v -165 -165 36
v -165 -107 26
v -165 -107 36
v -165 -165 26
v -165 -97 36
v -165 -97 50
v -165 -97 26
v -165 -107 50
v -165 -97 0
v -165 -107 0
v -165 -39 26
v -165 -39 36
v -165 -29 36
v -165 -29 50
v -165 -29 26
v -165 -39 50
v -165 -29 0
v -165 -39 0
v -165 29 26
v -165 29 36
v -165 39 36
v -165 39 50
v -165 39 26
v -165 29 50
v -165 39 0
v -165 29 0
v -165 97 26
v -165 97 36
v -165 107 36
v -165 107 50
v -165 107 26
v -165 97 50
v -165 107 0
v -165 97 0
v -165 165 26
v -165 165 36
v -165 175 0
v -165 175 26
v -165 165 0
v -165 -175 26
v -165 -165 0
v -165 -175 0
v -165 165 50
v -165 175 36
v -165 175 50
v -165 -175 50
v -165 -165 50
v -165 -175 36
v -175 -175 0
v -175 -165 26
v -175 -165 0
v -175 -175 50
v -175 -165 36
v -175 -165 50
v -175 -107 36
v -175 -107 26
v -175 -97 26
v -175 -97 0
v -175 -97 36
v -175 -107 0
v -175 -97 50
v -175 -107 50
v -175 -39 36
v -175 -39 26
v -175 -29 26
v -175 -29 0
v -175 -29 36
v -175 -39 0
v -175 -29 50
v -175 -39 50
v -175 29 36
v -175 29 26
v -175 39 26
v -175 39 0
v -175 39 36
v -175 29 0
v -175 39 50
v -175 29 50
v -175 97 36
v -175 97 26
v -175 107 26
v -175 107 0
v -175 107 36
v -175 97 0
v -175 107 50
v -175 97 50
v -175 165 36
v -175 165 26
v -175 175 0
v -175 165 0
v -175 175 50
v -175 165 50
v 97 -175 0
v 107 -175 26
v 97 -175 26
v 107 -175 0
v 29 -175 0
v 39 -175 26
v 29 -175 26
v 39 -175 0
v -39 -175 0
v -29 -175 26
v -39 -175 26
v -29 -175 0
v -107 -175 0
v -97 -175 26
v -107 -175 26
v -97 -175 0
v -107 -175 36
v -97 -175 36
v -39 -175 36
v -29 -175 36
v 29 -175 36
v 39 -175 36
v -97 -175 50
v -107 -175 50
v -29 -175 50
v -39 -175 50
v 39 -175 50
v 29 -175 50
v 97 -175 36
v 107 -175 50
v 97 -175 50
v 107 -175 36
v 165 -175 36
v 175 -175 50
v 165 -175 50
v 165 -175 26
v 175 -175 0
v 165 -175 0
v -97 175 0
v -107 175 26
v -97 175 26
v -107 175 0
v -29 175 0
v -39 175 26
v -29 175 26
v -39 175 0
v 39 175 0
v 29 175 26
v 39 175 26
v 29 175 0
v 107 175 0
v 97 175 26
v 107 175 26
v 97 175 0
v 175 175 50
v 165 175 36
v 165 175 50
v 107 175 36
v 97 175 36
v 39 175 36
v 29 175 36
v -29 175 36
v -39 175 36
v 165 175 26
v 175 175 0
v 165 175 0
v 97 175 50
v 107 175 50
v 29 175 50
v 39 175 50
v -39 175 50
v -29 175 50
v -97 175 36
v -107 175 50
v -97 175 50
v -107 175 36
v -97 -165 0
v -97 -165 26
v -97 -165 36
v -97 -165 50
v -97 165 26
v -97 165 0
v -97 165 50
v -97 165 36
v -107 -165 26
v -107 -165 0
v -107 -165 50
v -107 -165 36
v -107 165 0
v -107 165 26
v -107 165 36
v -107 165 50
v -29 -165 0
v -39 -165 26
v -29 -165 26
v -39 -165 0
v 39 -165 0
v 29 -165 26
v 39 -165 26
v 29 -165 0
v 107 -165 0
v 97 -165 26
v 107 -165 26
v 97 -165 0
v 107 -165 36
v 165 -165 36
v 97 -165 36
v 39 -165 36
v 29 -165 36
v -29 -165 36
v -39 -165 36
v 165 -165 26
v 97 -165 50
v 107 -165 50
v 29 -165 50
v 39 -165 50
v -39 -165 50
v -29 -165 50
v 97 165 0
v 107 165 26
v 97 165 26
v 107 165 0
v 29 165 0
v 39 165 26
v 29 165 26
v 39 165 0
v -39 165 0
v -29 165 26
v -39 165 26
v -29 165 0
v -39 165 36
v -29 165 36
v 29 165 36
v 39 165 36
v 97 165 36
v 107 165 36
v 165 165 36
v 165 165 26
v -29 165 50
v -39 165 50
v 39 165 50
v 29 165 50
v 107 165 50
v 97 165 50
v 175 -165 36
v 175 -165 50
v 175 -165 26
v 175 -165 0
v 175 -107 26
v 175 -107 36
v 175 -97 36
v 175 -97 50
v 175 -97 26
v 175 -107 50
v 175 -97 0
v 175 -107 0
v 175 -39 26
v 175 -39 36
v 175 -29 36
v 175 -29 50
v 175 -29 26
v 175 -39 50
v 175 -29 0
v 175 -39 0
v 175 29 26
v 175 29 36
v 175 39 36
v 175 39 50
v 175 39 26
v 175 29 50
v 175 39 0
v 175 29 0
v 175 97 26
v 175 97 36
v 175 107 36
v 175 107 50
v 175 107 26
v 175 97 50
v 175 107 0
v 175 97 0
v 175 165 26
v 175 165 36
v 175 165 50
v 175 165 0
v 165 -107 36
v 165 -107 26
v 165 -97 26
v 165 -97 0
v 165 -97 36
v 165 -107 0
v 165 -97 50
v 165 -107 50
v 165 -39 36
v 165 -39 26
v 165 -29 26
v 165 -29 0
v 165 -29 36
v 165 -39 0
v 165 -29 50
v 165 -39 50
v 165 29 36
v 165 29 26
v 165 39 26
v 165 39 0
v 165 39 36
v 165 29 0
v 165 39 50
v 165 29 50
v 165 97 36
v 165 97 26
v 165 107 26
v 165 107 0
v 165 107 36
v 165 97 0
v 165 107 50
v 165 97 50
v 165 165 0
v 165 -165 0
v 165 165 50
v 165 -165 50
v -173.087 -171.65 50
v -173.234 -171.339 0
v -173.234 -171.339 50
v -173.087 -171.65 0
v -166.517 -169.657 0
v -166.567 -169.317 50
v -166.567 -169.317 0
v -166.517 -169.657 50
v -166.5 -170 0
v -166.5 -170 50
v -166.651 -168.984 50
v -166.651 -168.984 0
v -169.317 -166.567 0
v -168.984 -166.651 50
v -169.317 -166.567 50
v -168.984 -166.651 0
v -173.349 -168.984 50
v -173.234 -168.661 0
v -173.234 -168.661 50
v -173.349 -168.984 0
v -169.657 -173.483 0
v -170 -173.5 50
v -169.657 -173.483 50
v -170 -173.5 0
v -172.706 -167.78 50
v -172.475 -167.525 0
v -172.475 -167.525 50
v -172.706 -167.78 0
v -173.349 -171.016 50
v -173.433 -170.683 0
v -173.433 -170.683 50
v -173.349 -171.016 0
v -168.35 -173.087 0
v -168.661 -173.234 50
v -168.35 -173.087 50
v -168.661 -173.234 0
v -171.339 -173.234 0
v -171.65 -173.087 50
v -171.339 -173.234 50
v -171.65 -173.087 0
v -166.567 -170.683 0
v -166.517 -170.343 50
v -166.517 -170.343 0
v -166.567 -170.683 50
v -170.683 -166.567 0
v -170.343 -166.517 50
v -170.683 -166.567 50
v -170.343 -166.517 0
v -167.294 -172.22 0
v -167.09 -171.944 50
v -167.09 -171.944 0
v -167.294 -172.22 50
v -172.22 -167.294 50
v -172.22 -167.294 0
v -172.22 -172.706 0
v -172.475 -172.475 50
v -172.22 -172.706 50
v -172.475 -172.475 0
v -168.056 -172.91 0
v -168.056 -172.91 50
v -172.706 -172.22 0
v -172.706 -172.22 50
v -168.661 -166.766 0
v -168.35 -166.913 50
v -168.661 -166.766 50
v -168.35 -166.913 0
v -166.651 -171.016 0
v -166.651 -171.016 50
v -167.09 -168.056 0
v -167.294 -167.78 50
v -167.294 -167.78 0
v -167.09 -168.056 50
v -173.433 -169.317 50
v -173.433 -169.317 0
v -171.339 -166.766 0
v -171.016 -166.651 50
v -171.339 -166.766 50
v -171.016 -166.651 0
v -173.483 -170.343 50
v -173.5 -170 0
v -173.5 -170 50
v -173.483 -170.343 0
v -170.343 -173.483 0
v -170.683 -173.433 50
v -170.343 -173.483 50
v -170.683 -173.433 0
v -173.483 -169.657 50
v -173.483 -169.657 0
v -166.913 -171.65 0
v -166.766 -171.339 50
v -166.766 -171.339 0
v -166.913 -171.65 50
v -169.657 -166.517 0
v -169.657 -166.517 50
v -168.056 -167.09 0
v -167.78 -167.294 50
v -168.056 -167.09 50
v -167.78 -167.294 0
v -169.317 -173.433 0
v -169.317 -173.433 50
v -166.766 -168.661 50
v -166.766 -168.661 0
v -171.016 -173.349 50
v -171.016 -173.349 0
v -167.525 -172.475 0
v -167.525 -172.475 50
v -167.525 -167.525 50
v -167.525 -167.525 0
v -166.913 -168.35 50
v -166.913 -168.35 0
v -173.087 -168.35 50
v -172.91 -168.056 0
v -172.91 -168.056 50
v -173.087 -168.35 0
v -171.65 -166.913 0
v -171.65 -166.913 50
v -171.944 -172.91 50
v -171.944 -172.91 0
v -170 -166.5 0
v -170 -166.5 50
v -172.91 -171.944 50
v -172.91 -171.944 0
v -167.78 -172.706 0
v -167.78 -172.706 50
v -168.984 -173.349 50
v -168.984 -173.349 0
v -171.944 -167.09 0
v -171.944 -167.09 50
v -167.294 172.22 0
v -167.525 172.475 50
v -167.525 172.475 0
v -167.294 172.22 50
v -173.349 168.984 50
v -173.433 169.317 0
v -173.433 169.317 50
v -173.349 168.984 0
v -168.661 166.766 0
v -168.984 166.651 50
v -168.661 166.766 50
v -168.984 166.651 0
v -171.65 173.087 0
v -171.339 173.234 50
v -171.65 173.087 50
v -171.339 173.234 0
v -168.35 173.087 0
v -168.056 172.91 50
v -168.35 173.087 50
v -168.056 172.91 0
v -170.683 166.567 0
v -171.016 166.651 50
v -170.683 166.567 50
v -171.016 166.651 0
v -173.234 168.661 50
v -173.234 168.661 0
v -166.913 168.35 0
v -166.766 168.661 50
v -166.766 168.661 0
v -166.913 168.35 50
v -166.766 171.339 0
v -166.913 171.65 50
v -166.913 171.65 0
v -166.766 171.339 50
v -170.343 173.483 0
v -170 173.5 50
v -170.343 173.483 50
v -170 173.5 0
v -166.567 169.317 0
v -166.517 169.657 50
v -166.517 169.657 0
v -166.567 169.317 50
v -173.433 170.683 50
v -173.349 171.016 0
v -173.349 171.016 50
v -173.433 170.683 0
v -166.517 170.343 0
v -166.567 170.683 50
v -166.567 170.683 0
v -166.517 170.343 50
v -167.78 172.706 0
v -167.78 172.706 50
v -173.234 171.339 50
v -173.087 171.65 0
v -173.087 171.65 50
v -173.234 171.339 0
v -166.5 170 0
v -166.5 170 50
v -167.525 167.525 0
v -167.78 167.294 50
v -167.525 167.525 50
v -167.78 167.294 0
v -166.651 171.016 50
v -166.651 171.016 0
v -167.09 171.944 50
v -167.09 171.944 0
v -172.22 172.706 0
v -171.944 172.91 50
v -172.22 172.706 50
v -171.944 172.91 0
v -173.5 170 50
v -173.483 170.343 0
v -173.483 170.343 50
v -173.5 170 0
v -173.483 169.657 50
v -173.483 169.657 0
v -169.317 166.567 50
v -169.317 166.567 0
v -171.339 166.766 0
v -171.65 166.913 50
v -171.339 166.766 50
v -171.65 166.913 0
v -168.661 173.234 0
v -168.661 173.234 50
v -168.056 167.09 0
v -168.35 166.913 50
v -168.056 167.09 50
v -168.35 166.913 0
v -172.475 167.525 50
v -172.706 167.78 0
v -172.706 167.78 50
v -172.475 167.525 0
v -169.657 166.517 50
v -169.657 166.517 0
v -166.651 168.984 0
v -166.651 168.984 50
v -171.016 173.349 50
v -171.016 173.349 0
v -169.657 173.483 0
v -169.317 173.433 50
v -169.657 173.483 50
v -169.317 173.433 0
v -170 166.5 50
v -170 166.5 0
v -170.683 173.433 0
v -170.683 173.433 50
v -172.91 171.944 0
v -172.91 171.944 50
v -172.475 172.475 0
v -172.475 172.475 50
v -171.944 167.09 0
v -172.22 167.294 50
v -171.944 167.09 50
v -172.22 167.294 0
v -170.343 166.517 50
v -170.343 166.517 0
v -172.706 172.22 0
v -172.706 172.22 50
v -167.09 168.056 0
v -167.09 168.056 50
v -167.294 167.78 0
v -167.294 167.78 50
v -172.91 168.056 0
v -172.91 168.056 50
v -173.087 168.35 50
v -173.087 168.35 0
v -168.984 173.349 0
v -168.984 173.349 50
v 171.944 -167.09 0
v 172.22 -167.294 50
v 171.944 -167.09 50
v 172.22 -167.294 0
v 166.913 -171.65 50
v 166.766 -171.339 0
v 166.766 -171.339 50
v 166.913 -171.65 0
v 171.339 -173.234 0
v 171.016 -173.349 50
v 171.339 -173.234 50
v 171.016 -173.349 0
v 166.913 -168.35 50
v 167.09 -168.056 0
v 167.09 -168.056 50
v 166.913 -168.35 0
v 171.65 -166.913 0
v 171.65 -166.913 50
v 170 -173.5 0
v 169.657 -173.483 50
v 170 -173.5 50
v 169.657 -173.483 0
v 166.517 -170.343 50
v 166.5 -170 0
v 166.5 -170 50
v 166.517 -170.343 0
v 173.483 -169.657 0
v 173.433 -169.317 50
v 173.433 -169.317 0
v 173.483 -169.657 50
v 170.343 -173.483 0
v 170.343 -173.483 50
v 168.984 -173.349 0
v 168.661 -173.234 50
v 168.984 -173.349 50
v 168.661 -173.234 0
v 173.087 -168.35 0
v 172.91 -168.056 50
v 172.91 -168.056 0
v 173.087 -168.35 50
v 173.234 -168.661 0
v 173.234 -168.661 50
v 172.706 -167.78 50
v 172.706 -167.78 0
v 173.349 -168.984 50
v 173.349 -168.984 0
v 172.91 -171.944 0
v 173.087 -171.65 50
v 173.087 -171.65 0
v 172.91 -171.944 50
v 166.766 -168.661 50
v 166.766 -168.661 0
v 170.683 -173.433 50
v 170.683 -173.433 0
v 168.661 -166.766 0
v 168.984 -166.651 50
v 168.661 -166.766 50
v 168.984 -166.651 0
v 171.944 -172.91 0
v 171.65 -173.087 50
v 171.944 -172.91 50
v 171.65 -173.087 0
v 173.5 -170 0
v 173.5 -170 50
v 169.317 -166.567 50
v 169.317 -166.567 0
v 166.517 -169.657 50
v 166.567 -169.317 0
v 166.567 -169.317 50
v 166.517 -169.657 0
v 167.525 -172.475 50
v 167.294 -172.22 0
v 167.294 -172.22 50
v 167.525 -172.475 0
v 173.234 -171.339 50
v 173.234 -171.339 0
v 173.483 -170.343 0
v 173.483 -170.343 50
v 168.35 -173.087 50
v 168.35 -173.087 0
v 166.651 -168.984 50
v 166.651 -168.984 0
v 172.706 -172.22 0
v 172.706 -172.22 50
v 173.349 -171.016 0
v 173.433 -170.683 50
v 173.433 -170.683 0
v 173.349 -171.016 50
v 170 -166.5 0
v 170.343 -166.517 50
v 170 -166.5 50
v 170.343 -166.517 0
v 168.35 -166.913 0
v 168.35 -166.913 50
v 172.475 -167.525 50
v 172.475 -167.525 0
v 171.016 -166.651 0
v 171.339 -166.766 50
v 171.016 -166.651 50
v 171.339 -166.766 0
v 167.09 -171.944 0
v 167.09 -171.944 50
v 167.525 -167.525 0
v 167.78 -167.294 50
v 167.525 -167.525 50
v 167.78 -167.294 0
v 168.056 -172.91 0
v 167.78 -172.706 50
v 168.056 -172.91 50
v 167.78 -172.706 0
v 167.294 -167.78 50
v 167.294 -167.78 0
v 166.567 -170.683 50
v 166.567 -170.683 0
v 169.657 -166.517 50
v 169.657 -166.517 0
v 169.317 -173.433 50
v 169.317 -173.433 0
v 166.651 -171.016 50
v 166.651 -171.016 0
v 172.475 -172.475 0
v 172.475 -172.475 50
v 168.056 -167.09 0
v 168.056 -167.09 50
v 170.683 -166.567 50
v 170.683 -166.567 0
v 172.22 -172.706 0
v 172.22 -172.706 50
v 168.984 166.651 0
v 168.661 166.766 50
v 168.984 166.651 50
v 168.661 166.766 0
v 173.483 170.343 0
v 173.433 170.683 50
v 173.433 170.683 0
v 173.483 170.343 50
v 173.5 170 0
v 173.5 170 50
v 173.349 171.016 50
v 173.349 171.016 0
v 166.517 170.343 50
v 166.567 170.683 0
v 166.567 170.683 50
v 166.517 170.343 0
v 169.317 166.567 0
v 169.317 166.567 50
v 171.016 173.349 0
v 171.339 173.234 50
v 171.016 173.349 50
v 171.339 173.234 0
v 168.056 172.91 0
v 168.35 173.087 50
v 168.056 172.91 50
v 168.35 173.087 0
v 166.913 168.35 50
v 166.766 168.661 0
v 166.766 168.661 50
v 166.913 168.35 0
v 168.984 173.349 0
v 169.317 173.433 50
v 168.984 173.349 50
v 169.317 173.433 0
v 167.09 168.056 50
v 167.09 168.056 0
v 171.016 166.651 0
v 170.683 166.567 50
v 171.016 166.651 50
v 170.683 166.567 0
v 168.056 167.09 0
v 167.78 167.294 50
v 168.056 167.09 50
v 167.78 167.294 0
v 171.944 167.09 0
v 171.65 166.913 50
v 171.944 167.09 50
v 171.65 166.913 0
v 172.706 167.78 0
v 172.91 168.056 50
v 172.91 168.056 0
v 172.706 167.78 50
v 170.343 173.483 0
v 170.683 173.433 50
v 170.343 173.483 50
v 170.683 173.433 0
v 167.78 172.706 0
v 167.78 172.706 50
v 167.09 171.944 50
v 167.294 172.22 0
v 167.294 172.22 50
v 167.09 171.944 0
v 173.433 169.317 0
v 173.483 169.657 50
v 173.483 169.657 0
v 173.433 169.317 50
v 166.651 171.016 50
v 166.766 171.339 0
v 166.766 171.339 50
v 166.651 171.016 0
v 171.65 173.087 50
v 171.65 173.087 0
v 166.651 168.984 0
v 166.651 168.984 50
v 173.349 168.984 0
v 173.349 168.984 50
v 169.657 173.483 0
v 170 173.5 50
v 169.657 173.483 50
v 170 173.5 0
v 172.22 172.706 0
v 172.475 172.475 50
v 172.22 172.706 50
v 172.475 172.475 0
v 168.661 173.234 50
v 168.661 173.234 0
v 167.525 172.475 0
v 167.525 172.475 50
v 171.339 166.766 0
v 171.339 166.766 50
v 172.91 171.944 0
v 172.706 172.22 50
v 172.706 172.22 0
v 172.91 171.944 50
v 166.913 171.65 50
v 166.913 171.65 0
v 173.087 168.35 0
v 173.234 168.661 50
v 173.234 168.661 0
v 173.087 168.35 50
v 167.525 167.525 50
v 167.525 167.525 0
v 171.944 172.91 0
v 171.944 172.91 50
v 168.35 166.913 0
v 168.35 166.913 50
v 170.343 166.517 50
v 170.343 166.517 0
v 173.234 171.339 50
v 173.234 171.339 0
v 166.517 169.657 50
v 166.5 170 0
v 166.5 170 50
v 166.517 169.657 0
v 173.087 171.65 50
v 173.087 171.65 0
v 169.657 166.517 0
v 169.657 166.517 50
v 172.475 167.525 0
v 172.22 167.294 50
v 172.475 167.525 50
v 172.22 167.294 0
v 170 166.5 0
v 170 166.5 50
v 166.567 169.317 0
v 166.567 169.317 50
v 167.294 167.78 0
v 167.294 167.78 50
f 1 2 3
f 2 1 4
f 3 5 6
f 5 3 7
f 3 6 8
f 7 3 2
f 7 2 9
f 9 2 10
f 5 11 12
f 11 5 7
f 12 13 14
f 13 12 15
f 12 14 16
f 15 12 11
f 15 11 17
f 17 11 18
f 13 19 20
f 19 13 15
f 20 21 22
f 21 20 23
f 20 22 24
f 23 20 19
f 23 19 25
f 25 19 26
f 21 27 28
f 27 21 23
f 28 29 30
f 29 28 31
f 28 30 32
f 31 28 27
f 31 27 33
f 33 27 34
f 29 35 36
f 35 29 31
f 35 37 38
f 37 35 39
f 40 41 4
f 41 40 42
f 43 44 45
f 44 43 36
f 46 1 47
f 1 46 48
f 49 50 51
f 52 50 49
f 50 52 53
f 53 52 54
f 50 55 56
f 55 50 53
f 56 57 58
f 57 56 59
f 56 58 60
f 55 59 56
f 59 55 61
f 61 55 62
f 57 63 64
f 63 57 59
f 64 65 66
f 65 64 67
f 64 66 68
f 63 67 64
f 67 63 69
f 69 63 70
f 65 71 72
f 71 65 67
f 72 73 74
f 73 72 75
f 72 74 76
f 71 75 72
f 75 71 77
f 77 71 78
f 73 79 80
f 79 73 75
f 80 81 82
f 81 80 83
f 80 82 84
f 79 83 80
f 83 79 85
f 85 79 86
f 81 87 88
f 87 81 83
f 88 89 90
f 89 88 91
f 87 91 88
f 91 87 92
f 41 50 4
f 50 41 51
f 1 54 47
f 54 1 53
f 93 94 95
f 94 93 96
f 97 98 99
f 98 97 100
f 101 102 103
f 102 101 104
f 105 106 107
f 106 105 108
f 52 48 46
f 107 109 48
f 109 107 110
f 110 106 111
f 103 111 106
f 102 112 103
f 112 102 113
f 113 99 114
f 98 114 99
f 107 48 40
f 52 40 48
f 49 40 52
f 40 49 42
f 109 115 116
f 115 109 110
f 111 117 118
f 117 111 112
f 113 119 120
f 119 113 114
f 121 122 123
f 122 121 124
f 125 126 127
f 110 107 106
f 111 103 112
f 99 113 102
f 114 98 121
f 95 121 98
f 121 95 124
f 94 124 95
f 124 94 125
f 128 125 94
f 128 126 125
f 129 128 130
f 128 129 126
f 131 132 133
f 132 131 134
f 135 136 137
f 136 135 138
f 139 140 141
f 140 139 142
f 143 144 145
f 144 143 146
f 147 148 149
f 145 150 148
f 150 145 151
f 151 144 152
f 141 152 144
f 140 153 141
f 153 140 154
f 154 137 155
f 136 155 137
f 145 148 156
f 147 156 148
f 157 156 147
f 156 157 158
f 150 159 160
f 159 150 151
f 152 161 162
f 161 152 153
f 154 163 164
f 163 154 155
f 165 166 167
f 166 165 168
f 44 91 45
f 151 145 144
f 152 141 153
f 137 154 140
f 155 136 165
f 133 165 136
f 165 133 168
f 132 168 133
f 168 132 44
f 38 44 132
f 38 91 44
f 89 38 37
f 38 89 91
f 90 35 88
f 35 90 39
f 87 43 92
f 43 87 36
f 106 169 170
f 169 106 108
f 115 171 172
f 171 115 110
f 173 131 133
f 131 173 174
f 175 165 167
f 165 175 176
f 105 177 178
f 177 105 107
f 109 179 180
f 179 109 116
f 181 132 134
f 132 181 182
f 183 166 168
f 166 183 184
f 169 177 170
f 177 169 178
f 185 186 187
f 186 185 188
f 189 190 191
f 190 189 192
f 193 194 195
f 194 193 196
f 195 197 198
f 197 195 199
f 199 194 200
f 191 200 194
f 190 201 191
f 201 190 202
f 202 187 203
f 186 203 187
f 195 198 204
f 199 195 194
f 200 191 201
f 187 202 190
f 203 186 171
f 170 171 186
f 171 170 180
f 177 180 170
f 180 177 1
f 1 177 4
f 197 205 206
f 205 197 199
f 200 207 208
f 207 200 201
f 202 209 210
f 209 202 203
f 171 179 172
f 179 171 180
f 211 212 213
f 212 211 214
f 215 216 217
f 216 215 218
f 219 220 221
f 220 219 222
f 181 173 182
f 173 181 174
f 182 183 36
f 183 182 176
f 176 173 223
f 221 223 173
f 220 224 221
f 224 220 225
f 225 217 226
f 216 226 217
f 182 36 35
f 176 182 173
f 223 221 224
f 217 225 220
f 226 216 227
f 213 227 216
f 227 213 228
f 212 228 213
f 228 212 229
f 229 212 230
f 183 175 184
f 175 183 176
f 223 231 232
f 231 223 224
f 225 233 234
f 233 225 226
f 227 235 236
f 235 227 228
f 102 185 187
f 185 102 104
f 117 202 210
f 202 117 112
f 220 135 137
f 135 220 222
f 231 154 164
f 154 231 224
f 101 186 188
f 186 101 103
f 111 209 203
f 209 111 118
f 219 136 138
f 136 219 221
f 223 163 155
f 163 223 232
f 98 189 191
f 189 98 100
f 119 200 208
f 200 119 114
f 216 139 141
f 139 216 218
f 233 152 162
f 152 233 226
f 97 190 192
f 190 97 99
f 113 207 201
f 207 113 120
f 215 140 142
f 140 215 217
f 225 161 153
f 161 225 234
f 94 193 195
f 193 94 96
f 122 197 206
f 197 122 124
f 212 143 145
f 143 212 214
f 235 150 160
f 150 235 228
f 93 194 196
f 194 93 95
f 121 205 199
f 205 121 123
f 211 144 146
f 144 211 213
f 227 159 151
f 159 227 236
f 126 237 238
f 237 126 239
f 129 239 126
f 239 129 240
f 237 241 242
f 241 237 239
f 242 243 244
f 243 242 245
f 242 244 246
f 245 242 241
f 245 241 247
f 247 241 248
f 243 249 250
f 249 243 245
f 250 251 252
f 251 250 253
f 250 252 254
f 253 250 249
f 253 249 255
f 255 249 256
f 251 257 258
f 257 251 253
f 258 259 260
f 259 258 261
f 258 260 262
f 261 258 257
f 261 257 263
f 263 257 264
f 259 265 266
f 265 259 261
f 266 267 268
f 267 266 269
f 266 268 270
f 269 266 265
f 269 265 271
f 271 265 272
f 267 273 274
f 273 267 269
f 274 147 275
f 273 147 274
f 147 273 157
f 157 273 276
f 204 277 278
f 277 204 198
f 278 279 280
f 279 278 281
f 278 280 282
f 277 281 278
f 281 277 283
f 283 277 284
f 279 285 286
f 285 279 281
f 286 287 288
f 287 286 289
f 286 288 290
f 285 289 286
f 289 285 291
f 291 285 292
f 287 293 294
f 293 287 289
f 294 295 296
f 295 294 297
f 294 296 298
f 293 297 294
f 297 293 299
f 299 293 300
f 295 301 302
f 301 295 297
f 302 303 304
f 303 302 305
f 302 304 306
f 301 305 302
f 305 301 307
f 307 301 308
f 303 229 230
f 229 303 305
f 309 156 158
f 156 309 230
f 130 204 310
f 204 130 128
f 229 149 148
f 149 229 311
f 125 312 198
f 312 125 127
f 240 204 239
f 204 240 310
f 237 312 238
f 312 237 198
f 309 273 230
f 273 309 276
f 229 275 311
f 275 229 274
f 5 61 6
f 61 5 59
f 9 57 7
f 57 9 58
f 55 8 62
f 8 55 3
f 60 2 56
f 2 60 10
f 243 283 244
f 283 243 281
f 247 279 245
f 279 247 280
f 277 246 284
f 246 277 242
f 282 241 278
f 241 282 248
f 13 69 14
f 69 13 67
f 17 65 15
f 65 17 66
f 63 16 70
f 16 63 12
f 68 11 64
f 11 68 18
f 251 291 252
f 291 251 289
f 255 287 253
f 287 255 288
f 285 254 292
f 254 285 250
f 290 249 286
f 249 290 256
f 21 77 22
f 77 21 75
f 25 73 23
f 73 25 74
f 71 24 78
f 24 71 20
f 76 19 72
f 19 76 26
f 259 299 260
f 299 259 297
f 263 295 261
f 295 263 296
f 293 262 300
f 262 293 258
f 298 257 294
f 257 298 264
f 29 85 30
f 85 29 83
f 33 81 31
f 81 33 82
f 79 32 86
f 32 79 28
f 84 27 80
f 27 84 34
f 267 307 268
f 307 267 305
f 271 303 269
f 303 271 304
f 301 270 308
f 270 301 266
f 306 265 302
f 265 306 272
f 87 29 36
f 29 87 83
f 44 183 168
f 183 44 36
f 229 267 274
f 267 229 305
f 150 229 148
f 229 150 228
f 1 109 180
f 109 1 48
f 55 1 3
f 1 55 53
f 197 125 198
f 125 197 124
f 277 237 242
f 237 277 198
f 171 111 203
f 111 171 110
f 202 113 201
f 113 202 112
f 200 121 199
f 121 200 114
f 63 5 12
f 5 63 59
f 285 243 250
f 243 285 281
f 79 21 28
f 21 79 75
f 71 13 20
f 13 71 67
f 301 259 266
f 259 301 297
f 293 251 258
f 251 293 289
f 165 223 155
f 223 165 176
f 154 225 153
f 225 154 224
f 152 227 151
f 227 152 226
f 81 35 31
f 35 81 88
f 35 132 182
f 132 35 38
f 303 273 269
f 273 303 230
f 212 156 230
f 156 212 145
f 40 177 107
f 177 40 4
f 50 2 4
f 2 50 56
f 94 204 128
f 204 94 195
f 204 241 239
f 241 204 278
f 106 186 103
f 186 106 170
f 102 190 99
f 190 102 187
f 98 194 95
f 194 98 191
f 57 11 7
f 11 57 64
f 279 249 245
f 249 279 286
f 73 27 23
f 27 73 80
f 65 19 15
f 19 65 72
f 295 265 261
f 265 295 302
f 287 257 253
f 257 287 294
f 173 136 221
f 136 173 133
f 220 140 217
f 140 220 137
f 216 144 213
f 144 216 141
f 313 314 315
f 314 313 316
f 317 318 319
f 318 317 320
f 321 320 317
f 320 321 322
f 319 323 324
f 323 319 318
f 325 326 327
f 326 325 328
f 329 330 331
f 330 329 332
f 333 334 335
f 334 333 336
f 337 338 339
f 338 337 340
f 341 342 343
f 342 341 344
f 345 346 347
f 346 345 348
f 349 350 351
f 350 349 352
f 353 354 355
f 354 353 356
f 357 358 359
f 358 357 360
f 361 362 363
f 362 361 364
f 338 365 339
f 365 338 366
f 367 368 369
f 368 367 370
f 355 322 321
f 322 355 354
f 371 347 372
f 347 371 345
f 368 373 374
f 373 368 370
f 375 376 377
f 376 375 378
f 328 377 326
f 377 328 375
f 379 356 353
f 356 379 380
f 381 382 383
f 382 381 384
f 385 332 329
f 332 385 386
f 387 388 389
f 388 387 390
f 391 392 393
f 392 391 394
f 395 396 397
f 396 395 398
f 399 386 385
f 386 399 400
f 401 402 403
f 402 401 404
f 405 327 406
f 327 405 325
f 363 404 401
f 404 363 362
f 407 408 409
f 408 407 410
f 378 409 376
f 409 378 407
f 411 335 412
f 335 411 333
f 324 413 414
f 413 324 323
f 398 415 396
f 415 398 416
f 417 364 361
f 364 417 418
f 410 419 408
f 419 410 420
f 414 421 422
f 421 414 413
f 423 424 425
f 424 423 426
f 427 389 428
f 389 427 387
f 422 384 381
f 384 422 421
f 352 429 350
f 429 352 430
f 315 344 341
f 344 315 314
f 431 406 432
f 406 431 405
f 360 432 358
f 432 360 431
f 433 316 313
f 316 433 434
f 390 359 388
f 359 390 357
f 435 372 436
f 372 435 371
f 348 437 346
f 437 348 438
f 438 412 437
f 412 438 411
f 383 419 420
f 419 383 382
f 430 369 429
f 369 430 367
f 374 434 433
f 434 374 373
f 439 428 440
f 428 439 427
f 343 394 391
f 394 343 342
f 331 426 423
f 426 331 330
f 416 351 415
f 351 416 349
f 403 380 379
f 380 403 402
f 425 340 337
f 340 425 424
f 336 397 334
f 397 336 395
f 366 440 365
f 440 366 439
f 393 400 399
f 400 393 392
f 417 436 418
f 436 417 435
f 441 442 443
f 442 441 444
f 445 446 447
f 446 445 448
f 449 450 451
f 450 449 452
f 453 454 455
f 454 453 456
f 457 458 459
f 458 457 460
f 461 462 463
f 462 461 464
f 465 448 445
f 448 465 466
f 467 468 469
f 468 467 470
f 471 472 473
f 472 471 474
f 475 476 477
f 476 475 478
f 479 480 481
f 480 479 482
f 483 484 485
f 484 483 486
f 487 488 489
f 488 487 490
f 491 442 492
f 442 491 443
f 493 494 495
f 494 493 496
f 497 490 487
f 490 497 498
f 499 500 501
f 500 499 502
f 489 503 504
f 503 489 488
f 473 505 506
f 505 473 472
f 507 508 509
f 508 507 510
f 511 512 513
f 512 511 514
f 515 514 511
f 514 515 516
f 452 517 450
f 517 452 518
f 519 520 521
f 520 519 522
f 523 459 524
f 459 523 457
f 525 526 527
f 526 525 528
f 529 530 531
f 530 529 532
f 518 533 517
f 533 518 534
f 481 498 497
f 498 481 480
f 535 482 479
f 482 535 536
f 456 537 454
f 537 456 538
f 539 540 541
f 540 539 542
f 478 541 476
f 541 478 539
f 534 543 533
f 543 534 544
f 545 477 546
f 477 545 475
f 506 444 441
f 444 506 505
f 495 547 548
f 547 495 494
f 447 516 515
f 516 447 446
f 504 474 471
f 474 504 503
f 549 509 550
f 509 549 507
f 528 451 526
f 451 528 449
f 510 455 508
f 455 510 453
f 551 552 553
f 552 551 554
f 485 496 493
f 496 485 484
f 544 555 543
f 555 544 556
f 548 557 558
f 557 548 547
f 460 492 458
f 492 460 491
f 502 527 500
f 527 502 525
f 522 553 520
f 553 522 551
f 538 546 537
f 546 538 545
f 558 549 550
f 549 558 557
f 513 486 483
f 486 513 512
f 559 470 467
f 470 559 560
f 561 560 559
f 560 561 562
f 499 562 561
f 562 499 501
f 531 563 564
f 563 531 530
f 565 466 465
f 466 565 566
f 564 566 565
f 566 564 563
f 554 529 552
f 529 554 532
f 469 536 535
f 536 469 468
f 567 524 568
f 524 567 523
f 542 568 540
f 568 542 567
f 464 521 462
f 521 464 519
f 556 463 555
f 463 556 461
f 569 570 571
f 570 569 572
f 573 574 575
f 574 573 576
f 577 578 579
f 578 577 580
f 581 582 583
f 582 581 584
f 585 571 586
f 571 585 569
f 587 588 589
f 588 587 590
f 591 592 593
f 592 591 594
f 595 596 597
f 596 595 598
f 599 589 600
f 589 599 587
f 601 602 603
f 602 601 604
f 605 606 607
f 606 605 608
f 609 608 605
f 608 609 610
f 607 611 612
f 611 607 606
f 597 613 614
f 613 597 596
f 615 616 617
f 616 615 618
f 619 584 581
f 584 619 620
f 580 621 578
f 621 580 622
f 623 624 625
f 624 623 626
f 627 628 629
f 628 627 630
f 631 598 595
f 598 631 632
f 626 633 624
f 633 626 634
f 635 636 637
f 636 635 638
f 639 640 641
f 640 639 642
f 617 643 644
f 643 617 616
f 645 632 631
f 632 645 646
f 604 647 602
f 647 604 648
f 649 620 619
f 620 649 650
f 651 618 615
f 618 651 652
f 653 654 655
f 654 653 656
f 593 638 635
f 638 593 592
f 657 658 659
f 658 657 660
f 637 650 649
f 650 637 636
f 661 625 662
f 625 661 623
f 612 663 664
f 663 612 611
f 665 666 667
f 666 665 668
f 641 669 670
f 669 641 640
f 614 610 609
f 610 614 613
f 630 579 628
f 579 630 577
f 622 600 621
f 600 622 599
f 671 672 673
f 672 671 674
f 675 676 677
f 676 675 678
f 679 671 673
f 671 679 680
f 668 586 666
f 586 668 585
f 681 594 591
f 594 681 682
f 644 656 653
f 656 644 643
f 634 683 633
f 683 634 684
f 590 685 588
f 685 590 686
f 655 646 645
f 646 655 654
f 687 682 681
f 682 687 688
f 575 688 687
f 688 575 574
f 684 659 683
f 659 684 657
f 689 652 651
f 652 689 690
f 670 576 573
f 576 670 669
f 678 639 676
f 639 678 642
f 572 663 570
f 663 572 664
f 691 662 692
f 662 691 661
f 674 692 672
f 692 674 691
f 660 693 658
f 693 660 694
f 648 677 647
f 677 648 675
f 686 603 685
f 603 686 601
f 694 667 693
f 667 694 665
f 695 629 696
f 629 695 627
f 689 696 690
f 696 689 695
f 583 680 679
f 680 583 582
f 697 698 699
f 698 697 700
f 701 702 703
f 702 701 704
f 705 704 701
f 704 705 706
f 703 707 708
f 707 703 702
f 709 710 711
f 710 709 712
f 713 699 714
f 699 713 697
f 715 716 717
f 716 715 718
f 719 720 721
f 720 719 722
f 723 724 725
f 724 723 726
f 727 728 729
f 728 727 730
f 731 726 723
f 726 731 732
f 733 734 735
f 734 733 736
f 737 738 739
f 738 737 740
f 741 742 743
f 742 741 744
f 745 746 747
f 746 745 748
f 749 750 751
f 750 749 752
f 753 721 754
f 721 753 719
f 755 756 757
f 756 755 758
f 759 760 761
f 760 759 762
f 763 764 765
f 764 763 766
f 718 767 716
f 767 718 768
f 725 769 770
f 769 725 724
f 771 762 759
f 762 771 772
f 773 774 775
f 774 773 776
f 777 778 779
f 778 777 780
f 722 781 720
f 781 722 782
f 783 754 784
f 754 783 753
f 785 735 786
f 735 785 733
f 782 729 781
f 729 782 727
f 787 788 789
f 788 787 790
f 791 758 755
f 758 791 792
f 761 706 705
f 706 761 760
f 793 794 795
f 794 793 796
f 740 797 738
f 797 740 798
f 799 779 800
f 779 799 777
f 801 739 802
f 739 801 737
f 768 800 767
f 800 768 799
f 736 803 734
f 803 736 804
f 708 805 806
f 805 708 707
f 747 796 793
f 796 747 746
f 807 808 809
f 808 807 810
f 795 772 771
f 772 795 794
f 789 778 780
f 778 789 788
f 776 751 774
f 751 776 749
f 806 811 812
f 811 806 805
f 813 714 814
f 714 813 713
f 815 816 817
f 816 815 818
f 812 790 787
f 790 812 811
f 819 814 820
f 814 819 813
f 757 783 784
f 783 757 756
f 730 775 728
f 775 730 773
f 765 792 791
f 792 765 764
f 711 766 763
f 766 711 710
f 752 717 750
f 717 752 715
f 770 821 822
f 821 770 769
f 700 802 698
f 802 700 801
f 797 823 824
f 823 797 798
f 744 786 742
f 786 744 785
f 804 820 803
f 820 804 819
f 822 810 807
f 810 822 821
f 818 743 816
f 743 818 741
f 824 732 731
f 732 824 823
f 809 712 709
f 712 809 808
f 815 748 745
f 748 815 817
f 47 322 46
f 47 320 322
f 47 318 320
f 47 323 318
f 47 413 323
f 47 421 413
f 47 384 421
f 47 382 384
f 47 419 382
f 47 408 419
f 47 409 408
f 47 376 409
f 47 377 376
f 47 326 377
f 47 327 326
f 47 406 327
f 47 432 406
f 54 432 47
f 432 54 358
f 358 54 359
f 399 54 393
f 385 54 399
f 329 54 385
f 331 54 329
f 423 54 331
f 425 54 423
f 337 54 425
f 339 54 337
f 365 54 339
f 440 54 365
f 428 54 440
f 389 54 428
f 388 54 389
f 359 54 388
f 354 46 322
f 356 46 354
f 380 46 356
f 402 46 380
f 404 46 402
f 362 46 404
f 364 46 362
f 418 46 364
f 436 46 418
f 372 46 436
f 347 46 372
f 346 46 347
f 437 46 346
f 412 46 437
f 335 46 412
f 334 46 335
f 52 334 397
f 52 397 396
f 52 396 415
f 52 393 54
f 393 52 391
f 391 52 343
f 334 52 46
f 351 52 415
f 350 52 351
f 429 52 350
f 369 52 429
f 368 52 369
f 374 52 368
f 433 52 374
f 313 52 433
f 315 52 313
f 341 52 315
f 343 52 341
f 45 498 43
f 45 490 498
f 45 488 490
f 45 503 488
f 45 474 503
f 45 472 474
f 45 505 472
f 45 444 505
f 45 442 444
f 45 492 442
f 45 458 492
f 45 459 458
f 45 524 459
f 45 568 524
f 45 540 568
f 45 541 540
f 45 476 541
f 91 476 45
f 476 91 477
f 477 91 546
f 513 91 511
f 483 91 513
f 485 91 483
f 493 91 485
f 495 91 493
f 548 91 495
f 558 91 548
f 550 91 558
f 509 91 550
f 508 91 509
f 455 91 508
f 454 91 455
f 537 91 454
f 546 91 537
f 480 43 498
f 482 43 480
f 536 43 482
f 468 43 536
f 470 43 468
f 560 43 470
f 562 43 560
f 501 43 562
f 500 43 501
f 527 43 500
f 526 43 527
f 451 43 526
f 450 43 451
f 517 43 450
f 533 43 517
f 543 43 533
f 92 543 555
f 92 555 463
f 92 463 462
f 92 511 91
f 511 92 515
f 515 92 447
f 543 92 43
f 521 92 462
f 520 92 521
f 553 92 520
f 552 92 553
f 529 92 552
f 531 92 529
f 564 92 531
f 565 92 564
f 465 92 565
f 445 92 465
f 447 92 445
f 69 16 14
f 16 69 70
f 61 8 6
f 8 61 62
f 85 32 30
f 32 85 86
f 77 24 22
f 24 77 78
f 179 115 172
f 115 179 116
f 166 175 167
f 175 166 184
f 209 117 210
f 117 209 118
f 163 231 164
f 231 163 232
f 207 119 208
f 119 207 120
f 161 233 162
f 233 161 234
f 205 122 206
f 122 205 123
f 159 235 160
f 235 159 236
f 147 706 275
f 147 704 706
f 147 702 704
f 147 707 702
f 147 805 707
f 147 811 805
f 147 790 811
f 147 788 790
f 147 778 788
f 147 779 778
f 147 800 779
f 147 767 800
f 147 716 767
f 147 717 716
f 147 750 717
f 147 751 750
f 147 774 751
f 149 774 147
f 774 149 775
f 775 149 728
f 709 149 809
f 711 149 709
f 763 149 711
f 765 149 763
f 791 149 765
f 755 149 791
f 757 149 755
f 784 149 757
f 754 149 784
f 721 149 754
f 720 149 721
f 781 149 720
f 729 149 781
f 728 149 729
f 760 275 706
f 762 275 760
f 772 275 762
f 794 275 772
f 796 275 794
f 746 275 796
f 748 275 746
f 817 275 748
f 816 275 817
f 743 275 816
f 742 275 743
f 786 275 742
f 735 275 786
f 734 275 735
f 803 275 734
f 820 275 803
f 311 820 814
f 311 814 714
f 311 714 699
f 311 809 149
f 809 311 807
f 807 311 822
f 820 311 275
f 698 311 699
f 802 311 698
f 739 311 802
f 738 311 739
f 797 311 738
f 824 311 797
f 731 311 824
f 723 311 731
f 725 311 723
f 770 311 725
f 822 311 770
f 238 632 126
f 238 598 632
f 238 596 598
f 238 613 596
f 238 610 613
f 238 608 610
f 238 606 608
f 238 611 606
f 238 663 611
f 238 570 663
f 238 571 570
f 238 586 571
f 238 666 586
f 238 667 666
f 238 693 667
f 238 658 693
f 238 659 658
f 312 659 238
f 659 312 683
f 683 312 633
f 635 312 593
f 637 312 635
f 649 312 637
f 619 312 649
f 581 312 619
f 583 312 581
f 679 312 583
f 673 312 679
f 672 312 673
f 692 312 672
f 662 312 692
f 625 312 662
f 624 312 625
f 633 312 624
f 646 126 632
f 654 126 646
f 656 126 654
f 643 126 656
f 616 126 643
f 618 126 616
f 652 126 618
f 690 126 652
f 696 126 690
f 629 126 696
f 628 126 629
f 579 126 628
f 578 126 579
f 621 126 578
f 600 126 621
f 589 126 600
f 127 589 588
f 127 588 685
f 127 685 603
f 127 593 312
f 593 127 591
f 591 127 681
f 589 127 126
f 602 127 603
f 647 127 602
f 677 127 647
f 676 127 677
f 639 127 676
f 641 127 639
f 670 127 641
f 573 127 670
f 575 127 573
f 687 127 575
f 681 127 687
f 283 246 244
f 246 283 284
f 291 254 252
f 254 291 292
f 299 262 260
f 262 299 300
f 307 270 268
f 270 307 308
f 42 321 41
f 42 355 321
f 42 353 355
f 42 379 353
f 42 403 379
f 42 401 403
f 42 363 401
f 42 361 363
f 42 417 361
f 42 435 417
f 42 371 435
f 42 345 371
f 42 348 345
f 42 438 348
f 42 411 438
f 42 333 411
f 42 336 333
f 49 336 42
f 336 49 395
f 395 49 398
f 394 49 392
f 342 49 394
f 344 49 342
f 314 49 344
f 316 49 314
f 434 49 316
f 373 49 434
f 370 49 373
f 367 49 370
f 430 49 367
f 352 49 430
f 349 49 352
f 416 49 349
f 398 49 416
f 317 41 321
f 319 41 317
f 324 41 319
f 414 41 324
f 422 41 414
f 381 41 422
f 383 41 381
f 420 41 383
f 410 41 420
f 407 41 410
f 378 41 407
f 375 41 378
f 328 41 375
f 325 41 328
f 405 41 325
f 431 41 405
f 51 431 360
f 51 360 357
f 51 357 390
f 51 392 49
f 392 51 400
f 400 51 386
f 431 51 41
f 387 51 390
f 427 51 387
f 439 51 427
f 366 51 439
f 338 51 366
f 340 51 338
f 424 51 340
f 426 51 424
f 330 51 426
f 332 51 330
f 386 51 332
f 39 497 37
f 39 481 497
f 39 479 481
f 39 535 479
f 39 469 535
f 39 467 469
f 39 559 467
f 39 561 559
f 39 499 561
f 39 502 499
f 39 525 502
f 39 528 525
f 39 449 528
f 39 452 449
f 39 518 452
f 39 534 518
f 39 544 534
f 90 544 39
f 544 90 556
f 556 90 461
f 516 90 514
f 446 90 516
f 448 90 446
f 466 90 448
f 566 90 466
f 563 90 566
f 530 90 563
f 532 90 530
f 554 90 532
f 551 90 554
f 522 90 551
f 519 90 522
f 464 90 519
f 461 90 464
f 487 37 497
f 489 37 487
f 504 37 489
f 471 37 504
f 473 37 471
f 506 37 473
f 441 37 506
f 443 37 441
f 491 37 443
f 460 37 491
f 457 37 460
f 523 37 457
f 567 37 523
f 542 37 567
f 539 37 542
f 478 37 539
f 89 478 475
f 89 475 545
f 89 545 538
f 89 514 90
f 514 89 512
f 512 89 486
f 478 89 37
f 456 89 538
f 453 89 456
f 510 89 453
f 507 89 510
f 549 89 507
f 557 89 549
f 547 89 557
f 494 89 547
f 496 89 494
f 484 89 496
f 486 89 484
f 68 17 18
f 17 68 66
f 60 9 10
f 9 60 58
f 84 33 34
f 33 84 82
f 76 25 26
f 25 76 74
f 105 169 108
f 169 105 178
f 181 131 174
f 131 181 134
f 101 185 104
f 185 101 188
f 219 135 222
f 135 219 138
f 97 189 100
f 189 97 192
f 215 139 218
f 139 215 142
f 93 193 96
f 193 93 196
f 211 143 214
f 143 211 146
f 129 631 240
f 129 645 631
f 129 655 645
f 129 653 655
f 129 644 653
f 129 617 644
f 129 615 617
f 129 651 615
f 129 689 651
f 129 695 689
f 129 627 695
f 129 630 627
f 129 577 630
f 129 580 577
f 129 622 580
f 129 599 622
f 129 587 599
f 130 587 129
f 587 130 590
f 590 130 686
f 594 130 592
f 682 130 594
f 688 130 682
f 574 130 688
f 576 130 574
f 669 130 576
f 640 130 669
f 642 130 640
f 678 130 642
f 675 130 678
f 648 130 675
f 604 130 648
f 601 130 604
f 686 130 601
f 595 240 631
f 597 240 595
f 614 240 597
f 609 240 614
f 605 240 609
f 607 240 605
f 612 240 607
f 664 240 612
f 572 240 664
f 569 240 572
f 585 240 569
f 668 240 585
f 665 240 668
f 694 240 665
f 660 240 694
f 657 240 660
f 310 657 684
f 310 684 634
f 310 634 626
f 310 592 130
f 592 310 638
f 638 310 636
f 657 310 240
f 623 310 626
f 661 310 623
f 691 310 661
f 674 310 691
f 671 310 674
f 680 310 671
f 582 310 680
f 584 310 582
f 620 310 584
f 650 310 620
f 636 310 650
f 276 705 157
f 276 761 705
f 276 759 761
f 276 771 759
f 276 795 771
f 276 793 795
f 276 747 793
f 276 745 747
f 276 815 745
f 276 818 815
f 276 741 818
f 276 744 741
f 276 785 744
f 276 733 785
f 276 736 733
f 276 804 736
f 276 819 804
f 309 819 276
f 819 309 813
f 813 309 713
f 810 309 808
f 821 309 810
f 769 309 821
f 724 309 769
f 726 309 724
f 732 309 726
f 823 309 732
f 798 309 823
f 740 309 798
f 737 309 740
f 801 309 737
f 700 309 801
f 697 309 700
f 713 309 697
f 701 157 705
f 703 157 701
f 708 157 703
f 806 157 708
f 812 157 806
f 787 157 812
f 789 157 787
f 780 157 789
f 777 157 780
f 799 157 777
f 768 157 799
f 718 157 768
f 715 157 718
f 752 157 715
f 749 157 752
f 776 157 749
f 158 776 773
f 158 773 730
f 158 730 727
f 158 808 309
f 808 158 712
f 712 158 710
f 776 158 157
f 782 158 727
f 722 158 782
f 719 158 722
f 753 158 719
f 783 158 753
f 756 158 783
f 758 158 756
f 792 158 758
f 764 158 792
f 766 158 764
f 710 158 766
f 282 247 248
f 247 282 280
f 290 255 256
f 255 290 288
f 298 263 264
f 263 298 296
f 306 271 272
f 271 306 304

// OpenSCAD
// Cage slice - index 5
bar = 10;
outer = 350;
half = outer / 2;
height = 700;

N_xy = 6;
N_z  = 11;

x_spacing = (outer - bar) / (N_xy - 1);
z_spacing = (height - bar) / (N_z  - 1);

xs = [ for (i = [0 : N_xy - 1]) (-half + bar/2 + i * x_spacing) ];
ys = xs;

zs = [ for (k = [0 : N_z - 1]) (bar/2 + k * z_spacing) ];

$fn = 64;

module cage_bars() {
    union() {
        // Vertical bars on front and back faces
        for (xv = xs) {
            translate([xv, -half + bar/2, height/2])
                cube([bar, bar, height], center = true);
            translate([xv,  half - bar/2, height/2])
                cube([bar, bar, height], center = true);
        }

        // Vertical bars on left and right faces
        for (yv = ys) {
            translate([-half + bar/2, yv, height/2])
                cube([bar, bar, height], center = true);
            translate([ half - bar/2, yv, height/2])
                cube([bar, bar, height], center = true);
        }

        // Horizontal x-bars on front and back faces
        for (zv = zs) {
            translate([0, -half + bar/2, zv])
                cube([outer, bar, bar], center = true);
            translate([0,  half - bar/2, zv])
                cube([outer, bar, bar], center = true);
        }

        // Horizontal y-bars on left and right faces
        for (zv = zs) {
            translate([-half + bar/2, 0, zv])
                cube([bar, outer, bar], center = true);
            translate([ half - bar/2, 0, zv])
                cube([bar, outer, bar], center = true);
        }

        // Floor and ceiling extra x-bars at all y positions
        z_floor = bar/2;
        z_ceil  = height - bar/2;
        for (yv = ys) {
            translate([0, yv, z_floor])
                cube([outer, bar, bar], center = true);
            translate([0, yv, z_ceil])
                cube([outer, bar, bar], center = true);
        }

        // Floor and ceiling extra y-bars at all x positions
        for (xv = xs) {
            translate([xv, 0, z_floor])
                cube([bar, outer, bar], center = true);
            translate([xv, 0, z_ceil])
                cube([bar, outer, bar], center = true);
        }
    }
}

module corner_holes() {
    hole_d = 7;
    for (sx = [-1, 1])
        for (sy = [-1, 1])
            translate([sx * (half - bar/2), sy * (half - bar/2), height/2])
                cylinder(h = height + 2, d = hole_d, center = true);
}

module cage_full() {
    difference() {
        cage_bars();
        corner_holes();
    }
}

slice_index = 5;
slice_height = 50;

module cage_slice() {
    translate([0, 0, -slice_index * slice_height]) {
        intersection() {
            cage_full();
            translate([0, 0, slice_index * slice_height + slice_height/2])
                cube([outer + 20, outer + 20, slice_height], center = true);
        }
    }
}

cage_slice();
